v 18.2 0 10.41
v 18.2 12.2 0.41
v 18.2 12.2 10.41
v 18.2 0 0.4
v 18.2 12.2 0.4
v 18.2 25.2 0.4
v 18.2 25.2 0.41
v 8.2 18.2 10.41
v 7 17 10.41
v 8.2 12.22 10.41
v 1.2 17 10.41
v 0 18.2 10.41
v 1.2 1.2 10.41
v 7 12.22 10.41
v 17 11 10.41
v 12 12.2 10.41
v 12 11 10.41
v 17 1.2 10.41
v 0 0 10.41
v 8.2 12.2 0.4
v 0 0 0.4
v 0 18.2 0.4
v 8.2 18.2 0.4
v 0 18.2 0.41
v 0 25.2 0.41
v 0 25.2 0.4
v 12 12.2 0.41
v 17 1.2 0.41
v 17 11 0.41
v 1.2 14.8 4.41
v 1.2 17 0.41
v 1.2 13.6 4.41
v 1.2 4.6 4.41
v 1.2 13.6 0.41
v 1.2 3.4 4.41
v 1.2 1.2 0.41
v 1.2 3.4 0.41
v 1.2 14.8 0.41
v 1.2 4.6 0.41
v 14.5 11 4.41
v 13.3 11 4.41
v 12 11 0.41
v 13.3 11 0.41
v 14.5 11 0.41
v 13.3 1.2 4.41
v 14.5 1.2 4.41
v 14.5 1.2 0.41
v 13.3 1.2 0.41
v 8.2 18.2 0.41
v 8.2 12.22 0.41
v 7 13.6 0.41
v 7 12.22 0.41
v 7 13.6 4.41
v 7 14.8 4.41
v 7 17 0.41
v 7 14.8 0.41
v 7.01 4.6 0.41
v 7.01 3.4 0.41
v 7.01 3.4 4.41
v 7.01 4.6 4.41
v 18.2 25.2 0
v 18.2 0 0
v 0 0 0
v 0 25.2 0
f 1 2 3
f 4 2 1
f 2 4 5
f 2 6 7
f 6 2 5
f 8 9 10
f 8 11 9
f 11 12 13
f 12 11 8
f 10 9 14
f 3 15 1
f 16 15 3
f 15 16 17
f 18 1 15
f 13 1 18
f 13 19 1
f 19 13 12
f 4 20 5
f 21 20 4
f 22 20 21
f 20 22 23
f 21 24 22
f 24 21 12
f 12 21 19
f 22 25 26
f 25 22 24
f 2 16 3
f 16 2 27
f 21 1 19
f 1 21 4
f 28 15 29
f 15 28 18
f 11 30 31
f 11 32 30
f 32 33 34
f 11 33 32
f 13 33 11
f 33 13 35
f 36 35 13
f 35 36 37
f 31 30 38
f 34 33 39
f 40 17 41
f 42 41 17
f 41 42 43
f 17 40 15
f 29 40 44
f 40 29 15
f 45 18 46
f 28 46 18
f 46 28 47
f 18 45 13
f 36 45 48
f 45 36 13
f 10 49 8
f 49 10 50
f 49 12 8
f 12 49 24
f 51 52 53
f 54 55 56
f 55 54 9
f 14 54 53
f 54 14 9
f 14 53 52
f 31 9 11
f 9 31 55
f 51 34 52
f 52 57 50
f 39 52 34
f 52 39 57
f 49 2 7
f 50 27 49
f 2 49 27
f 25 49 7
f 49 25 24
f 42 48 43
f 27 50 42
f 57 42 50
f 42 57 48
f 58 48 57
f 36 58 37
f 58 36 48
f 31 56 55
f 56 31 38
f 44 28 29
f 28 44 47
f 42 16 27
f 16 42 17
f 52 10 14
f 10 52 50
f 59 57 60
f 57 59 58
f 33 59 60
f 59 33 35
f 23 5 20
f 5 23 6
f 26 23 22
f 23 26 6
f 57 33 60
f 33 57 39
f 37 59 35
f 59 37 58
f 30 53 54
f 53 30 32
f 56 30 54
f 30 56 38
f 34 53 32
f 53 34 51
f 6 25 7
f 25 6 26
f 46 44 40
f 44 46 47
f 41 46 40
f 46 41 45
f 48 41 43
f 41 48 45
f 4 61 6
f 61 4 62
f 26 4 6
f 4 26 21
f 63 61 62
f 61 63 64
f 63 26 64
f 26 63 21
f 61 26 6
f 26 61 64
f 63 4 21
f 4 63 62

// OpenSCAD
// file: ../../Base/Rotation.scad
// Fischertechnik Box Foundation
// Geometry Helpers Rotation

include <PlacementOptions.scad>

// getRotatedSpace(space, rotation=NoRotation)
// Rotates the space dependent on the specified rotation

function getRotatedSpace(space, rotation=NoRotation) = [
    (rotation == Rotate90 || rotation == Rotate270) ? space.y : space.x,
    (rotation == Rotate90 || rotation == Rotate270) ? space.x : space.y
];

// Rotates the given space around the fixed left lower corner
// space = the space the children needs as width/depth list [width,depth]
// rotation = 0 Rotate0 degrees, 1 Rotate90 degrees, 2 Rotate180 degrees, 3 Rotate270 degrees (equivalent to -90)

module RotateFix(space, rotation=NoRotation) {
    dy = (rotation == Rotate0 || rotation == Rotate270) ? 0 :
        (rotation == Rotate90) ? space.x :
        space.y;
    dx = (rotation < Rotate180) ? 0 :
        (rotation == Rotate180) ? space.x :
        space.y;
    
    translate([dx, dy, 0])
        rotate([0, 0, rotations[rotation]])
            children();
}
// file: ../../Base/Alignment.scad
// Fischertechnik Box Foundation
// Geometry Helpers Alignment

include <PlacementOptions.scad>

// getAlignedX(elementWidth, spaceWidth, align=AlignRight, offset=0)
// Gets the aligned X offset of an element with the given
// width in the given space.
// elementWidth = The width of the element to positon
// spaceWidth = The space where the element should be aligned
// align = 0 AlignLeft, 1 AlignCenter, 2 AlignRight
// offset = an optional offset from the aligned position. When
// aligned left or centered, then positive values are in X direction.
// When aligned right then positive values are in negative X direction.

function getAlignedX(elementWidth, spaceWidth, align=AlignRight, offset=0) =
    (align == AlignLeft) ?
        offset :
        ((align == AlignCenter) ?
        (spaceWidth - elementWidth)/2 + offset :
        spaceWidth - offset - elementWidth);

// getAlignedY(elementDepth, spaceDepth, align=AlignTop, offset=0)
// Gets the aligned Y offset of an element with the given
// depth in the given space.
// elementDepth = The depth of the element to positon
// spaceDepth = The space where the element should be aligned
// align = 0 AlignBottom, 1 AlignCenter, 2 AlignTop
// offset = an optional offset from the aligned position. When
// aligned bottom or centered, then positive values are in Y direction.
// When aligned top then positive values are in negative Y direction.

function getAlignedY(elementDepth, spaceDepth, align=AlignTop, offset=0) =
    (align == AlignBottom) ?
        offset :
        ((align == AlignCenter) ?
        (spaceDepth - elementDepth)/2 + offset :
        spaceDepth - offset - elementDepth);
// file: ../../Base/PlacementOptions.scad
// Fischertechnik Box Foundation
// Placement Options

// Alignment
NoAlign = 0;
AlignLeft = 1;
AlignBottom = 2;
AlignCenter = 3;
AlignRight = 4;
AlignTop = 5;

// Element rotation degree steps
rotations = [0, -90, -180, -270];

// Rotation
NoRotation = 0;
Rotate0 = 0;
Rotate90 = 1;
Rotate180 = 2;
Rotate270 = 3;

// Docking (seen from above)
NoDock = -1;
DockLeft = 0;
DockTop = 1;
DockRight = 2;
DockCorner = 2;
DockBottom = 3;

// Web corners
LowerLeft = 0;
UpperLeft = 1;
UpperRight = 2;
LowerRight = 3;

// Web position relative to corner
LeftOfCorner = 0;
RightOfCorner = 1;
// file: ../../Base/Boxes.scad
// Fischertechnik Box Foundation
// Pre-designed Boxes

use <Constants.scad>

include <PlacementOptions.scad>

box190Width = 190;
box190Depth = 130;
box130Width = 130;
box130Depth = 95;

// Values are from an original ec3 box
topBottomDifference = 1.5;
outerHeight = 40;
baseThickness = 1.8;
innerHeight = outerHeight - baseThickness;
stackExcess = 5.7;
radius = 3.5;
wallThickness = 1.5;
tolerance = 0.2;

boxWallThickness = wallThickness;
boxBaseThickness = baseThickness;
boxWebWidth = 3.0;

// getBoxWallThickness()
// Gets the wall thickness of a Fischertechnik Box
function getBoxWallThickness() = boxWallThickness;

// getBoxUsageHeight(height = 38.2)
// Gets the usable height of a Fischertechnik box
// height = Outer height of the box from the bottom to the upper edge.
function getBoxUsageHeight(height = outerHeight) = height - baseThickness - stackExcess;

// getBoxInnerHeight()
// Gets the inner height of a Fischertechnik box, including the stack excess
function getBoxInnerHeight() = innerHeight;

// getBoxBaseThickness()
// Gets the thickness of the Fischertechnik box base.
function getBoxBaseThickness() = boxBaseThickness;

// getBoxWebWidth()
// Gets the width of a box web
function getBoxWebWidth() = boxWebWidth;

// getBox190Space()
// Gets the usable inner space of a Box 190 as an x/y-list
function getBox190Space() = [
    box190Width - 2*getBoxWallThickness() - topBottomDifference, 
    box190Depth - 2*getBoxWallThickness() - topBottomDifference ];

// RoundedCornerPlate(width, depth, height, radius)
// Creates a body plate with rounded corners for a box. Used
// also to create the complete box with the hull module.
// width = Width of the plate
// depth = depth of the plate 
// height = thickness of the plate
// radius = radius of the rounded corner
module RoundedCornerPlate(width, depth, height, radius) {
    translate([radius, radius])
    hull() {
        w = width-2*radius;
        d = depth-2*radius;
        cube([w, d, height]);
        cylinder(height, r=radius, $fn=getFragments());
        translate([w, 0])
            cylinder(height, r=radius, $fn=getFragments());
        translate([w, d])
            cylinder(height, r=radius, $fn=getFragments());
        translate([0, d])
            cylinder(height, r=radius, $fn=getFragments());
    }
}

// BoxBase(width, depth)
// Creates an empty stackable Fischertechnik compatible box
// width = Outer width of the box (190, 130, ...)
// depth = Outer depth of the box (130, 95, ...)

module BoxBase(width, depth, height=outerHeight) {    
    thinPlate = 0.01;

    innerHeight = height - baseThickness;    
    
    module Body(tolerance=tolerance) {
        hull() {
            // Bottom with tolerance to fit into the original boxes when stacked
            translate([-wallThickness+tolerance, -wallThickness+tolerance, -baseThickness])
                RoundedCornerPlate(width-topBottomDifference-2*tolerance, depth-topBottomDifference-2*tolerance, thinPlate, radius);
            
            // Top
            translate([-wallThickness-topBottomDifference/2, -wallThickness-topBottomDifference/2, innerHeight-thinPlate])
                RoundedCornerPlate(width, depth, thinPlate, radius);
         }
    }

    module Cutoff() {
        hull() {
            coWidth = width - 2*wallThickness;
            coDepth = depth - 2*wallThickness;
            
            // Bottom
            RoundedCornerPlate(coWidth-topBottomDifference, coDepth-topBottomDifference, thinPlate, radius);

            // Top
            translate([-topBottomDifference/2, -topBottomDifference/2, innerHeight+thinPlate]) 
                RoundedCornerPlate(coWidth, coDepth, thinPlate, radius);
        }
    }
    
    difference() {        
        Body();
        Cutoff();
        stackOffset = innerHeight - stackExcess;
        translate([0, 0, stackOffset + baseThickness])
            Body(tolerance=0);
    }
}

// Creates the Fischertechnik empty box 130x190 mm and places it at position 0,0
// 190x130 are the outer sizes, the inner space is slightly smaller. Use getBox190Space() to get the inner sizes.
// The box is positioned that the usable inner space is at the 0,0,0 position.

module Box190() {
    BoxBase(box190Width, box190Depth);
}

// Gets the usable inner space of a Box 130 as an x/y-list
function getBox130Space() = [
    box130Width - 2*getBoxWallThickness() - topBottomDifference, 
    box130Depth - 2*getBoxWallThickness() - topBottomDifference ];

// Creates the Fischertechnik empty box 95x130 mm and places it at position 0,0
// 190x130 are the outer sizes, the inner space is slightly smaller. Use getBox190Space() to get the inner sizes.
// The box is positioned that the usable inner space is at the 0,0,0 position.

module Box130() {
    BoxBase(box130Width, box130Depth);
}

// Creates a web at the specified box walls
// corner 0 = LowerLeft, 1 = UpperLeft, 2 = UpperRight, 3 = LowerRight
// side 0 = LeftOfCorner, 1 = RightOfCorner
// distance = Distance in mm from the corner
// boxSpace = inner width and depth of the box (default: Box 190)
// webWidth = length of the web (default is 3 mms)
// webThickness = thickness of the web (default is 1 mm)
// height = Height of the web (standard is getBoxUsageHeight())

module BoxWeb(corner, side, distance, boxSpace=getBox190Space(), webWidth=getBoxWebWidth(), webThickness=1.0, height=getBoxUsageHeight()) {
    sink = getBoxWallThickness()/2;

    width = (corner % 2 == 0) ? 
            (side == LeftOfCorner ? webWidth : webThickness) :
            (side == LeftOfCorner ? webThickness : webWidth);

    depth = (corner % 2 == 0) ? 
            (side == RightOfCorner ? webWidth : webThickness) :
            (side == RightOfCorner ? webThickness : webWidth);
    
    xDiff = corner == LowerLeft ? 
                (side == LeftOfCorner ? -sink : distance) :
            (corner == UpperLeft ?                
                (side == LeftOfCorner ? distance : -sink) :
            (corner == UpperRight ?
                (side == LeftOfCorner ? boxSpace.x-webWidth+sink : boxSpace.x-distance-webThickness) :
                (side == LeftOfCorner ? boxSpace.x-distance-webThickness: boxSpace.x-webWidth+sink)));

    yDiff = corner == LowerLeft ? 
                (side == RightOfCorner ? -sink : distance) :
            (corner == UpperLeft ?
                (side == RightOfCorner ? boxSpace.y-distance-webThickness : boxSpace.y-webWidth+sink) :
            (corner == UpperRight ?
                (side == RightOfCorner ? boxSpace.y-webWidth+sink : boxSpace.y-distance-webThickness) :
                (side == RightOfCorner ? distance : -sink)));
    
    translate([xDiff, yDiff, -getExcess()])
        cube([width, depth, height + 2*getExcess()]);
}
// file: ../../Base/Placement.scad
// Fischertechnik Box Foundation
// Geometry Helpers Placement

use <Constants.scad>
use <Alignment.scad>
use <Rotation.scad>
use <Boxes.scad>

include <PlacementOptions.scad>

// Place(x=0, y=0, elementSpace=[0,0], alignX=AlignLeft, alignY=AlignBottom, rotation=Rotate0, boxSpace=getBox190Space())
// Places the child at the specified position
// y = Y-Position. This is a relative position when an X aligment is specified.
// x = X-Position. This is a relative position when an Y aligment is specified.
// elementSpace = space of the element to be placed [x,y]
// alignX = -1=NoAlign, 0 AlignLeft, 1 AlignCenter, 3 AlignRight (elementSpace and boxSpace required!)
// alignY = -1=NoAlign, 2 AlignBottom, 1 AlignCenter, 4 AlignTop (elementSpace and boxSpace required!)
// rotation = 0 Rotate0 0 degrees, 1 Rotate90 90 degrees, 
// 2 Rotate180 180 degrees, 3 Rotate270 270 degrees (equivalent to -90)
// boxSpace = Inner space of the box where the placement occurs [x,y] - default is Box 190x130 inner space

module Place(x=0, y=0, elementSpace=[0,0], 
  alignX=AlignLeft, alignY=AlignBottom, 
  rotation=NoRotation, boxSpace=getBox190Space()) {

    module Position(x, y, space, rotation=Rotate0) {
        translate([x, y, 0])
            RotateFix(space, rotation)
                children();
    }

    space = getRotatedSpace(elementSpace, rotation);
    alignedX = getAlignedX(space.x, boxSpace.x, alignX, x);
    alignedY = getAlignedY(space.y, boxSpace.y, alignY, y);
    Position(alignedX, alignedY, elementSpace, rotation)
        children();
}

// Center(space=getBox130Space(), elementSpace=[0,0])
// space = Space where the children is centered. For cylinder use centered=true and no elementSpace.
// elementSpace = space of the element to be centered [x,y]

module Center(space=getBox190Space(), elementSpace=[0,0]) {
    Place(elementSpace=elementSpace, boxSpace=space, alignX=AlignCenter, alignY=AlignCenter)
        children();
}

// CenterHorizontal(width=0, y=0, offset=0, space=getBox130Space())
// width = Width of the element to be placed.
// y = Y position of the element
// offset = Offset from the center position (negative will be left of the center)
// space = Space where the element is placed

module CenterHorizontal(width=0, y=0, offset=0, space=getBox190Space()) {
    Place(x=offset, y=y, elementSpace=[width, 0], boxSpace=space, alignX=AlignCenter)
        children(0);
}

// CenterVertical(depth=0, x=0, offset=0, space=getBox130Space())
// depth = Depth of the element to be placed.
// x = X position of the element
// offset = Offset from the center position (negative will be down of the center)
// space = Space where the element is placed

module CenterVertical(depth=0, x=0, offset=0, space=getBox190Space()) {
    Place(x=x, y=offset, elementSpace=[0, depth], boxSpace=space, alignY=AlignCenter)
        children(0);
}

// getIsVertical(align)
// True if the specified alignment needs a vertical orientation for a divider (AlignRight, AlignLeft)

function getIsVertical(align) = (align == AlignRight || align == AlignLeft);

// getIsHorizontal(align)
// True if the specified alignment needs a horizontal orientation for a divider (AlignTop, AlignBottom)

function getIsHorizontal(align) = (align == AlignTop || align == AlignBottom);
// file: ../../Elements/AxisClip10.scad
// Fischertechnik Box Library
// Axis for clip 10
// 31023

use <../ModelBase/Simple.scad>
use <../Base/Constants.scad>

/* [Element Parameters] */
height = 23;
clipHeight = 10;

/* [Hidden] */
width = 12;
depth = 12;
upperDiameter = 3.6;

// getAxisClip10Space()
// Gets the space of a n axis for a clip 10 with spring ring (mot2)

function getAxisClip10Space() = [width, depth, height];

// AxisClip10(height, clipHeight)
// Axis for clip 10 with spring ring (mot2)
// height = Height of the complete axis (standard is 23, in mot3 its only 12)
// clipHeight = Height of the part for the clip (standard is 10, in mot3 its only 7)

module AxisClip10(height=height, clipHeight=clipHeight) {
    LeveledAxisWithSpace(height, height-clipHeight, getAxisClip10Space(), diameter=upperDiameter);
}

// Test
color("lightgray")
AxisClip10(height, clipHeight);
// file: ../../Base/Constants.scad
// Fischertechnik Box Foundation
// Constants

// Constant values necessary for multiple elements

// Base constants
dividerThickness = 1.2;
excess = 0.01;
fragments = 90;
tolerance = 0.8;

// Gets the thickness of a divider 
function getDividerThickness() = dividerThickness;

// Gets the excess that is used to merge walls into each other
function getExcess() = excess;

// Gets amount of fragments of a cylinder
function getFragments() = fragments;

// Gets the inner tolerance of a frame to each side
function getTolerance() = tolerance;


// Fischertechnik specific constants
axisDiameter = 4;
axisBottomDiameter = axisDiameter + 1;
axisTolerance = 0.2;

// Gets axis diameter of Fischertechnik axis
function getAxisDiameter() = axisDiameter;

// Gets axis diameter tolerance (subtracted for element axis)
function getAxisTolerance() = axisTolerance;

// Gets the axis diameter for standing axis
function getStandAxisDiameter() = getAxisDiameter() - getAxisTolerance();

// Gets axis bottom diameter for thicker part at the bottom
function getAxisBottomDiameter() = axisBottomDiameter;

pinHeight = 2.5;

// gets the height of a connecting pin
function getPinHeight() = pinHeight;

standardEdgeDistance = 2.5;
standardWebDistance = 11.5;
standardCornerLength = 15;

// gets the standard distance to the wall of the box for dockable frames with webs
function getStandardEdgeDistance() = standardEdgeDistance;

// gets the standard distance of each web to the corner of the dockable frame
function getStandardWebDistance() = standardWebDistance;

// gets the standard length of the corner walls of a dockable frame
function getStandardCornerLength() = standardCornerLength;

tubeWallFactor = 0.8;

// gets the wall thickness of a tube.
function getTubeWallThickness() = tubeWallFactor * getDividerThickness();

smallPartsFrameHeight = 20;

// gets the frame height for docked small parts boxes.
function getSmallPartsFrameHeight() = smallPartsFrameHeight;

hubRingDiameter = 19.5;
hubRingLevelDiameter = 21;

// gets the diameter of a tube matching the inner ring of a wheel
function getHubRingDiameter() = hubRingDiameter;

// gets the diameter of a hub tube with a thicker diameter
function getHubRingLevelDiameter() = hubRingLevelDiameter;
// file: ../../Elements/HolderGearSupportWithWorm.scad
// Fischertechnik Box Library
// Holder for gear support with worm
// 31069

use <../Base/Constants.scad>
use <../ModelBase/Simple.scad>

width = 15;
depth = 22;
height = 10;

// getHolderGearSupportWithWormSpace()
// Gets the space of a frame for a holder of a gear support with worm (mini-mot 1)

function getHolderGearSupportWithWormSpace() = getFrameOuterVolume([width, depth, height]);

// HolderGearSupportWithWorm()
// holder of a gear support with worm (mini-mot 1)

module HolderGearSupportWithWorm() {
    Space(getHolderGearSupportWithWormSpace());

    width1 = width;
    depth1 = 9;
    width2 = width;
    depth2 = 5;
    difference() {
        AngledFrame(width1, depth1, width2, depth2, height);
        cutoffWidth = 5;
        translate([getDividerThickness() + depth2 + getTolerance() - getExcess(), getDividerThickness() + depth1 + getTolerance() - getExcess()])
            cube([cutoffWidth + getExcess(), getDividerThickness() + 3*getExcess(), height + getExcess()]);
    }
    webHeight = 4;
    hVolume = [depth2 + getTolerance() + 2*getExcess(), getDividerThickness(), webHeight];
    vVolume = [getDividerThickness(), depth1 + getTolerance() + 2*getExcess(), webHeight];
    distance = 9;
    translate([getDividerThickness() - getExcess(), (width + getTolerance() - distance) / 2]) {
        Wall(hVolume);
        translate([0, distance + getDividerThickness()])
            Wall(hVolume);
    }
    rightDistance = 2.5;
    translate([width + getTolerance() - rightDistance, getDividerThickness() - getExcess()])
        Wall(vVolume);
}

// Tests
color("lightgray")
HolderGearSupportWithWorm();
// file: ../TestPrint.scad
// 3D Print Test Base

use <../Base/Constants.scad>

use <../Elements/AxisClip10.scad>

module TestPrint(elementSpace) {
    cube([elementSpace.x, elementSpace.y, 0.4]);
    translate([0,0,0.4+getExcess()]) {
        children();
    }
}

TestPrint(getAxisClip10Space())
    AxisClip10();
// main file
// 3D Print Test
// HolderGearSupportWithWorm

use <../TestPrint.scad>
use <../../Elements/HolderGearSupportWithWorm.scad>

TestPrint(getHolderGearSupportWithWormSpace())
    HolderGearSupportWithWorm();
